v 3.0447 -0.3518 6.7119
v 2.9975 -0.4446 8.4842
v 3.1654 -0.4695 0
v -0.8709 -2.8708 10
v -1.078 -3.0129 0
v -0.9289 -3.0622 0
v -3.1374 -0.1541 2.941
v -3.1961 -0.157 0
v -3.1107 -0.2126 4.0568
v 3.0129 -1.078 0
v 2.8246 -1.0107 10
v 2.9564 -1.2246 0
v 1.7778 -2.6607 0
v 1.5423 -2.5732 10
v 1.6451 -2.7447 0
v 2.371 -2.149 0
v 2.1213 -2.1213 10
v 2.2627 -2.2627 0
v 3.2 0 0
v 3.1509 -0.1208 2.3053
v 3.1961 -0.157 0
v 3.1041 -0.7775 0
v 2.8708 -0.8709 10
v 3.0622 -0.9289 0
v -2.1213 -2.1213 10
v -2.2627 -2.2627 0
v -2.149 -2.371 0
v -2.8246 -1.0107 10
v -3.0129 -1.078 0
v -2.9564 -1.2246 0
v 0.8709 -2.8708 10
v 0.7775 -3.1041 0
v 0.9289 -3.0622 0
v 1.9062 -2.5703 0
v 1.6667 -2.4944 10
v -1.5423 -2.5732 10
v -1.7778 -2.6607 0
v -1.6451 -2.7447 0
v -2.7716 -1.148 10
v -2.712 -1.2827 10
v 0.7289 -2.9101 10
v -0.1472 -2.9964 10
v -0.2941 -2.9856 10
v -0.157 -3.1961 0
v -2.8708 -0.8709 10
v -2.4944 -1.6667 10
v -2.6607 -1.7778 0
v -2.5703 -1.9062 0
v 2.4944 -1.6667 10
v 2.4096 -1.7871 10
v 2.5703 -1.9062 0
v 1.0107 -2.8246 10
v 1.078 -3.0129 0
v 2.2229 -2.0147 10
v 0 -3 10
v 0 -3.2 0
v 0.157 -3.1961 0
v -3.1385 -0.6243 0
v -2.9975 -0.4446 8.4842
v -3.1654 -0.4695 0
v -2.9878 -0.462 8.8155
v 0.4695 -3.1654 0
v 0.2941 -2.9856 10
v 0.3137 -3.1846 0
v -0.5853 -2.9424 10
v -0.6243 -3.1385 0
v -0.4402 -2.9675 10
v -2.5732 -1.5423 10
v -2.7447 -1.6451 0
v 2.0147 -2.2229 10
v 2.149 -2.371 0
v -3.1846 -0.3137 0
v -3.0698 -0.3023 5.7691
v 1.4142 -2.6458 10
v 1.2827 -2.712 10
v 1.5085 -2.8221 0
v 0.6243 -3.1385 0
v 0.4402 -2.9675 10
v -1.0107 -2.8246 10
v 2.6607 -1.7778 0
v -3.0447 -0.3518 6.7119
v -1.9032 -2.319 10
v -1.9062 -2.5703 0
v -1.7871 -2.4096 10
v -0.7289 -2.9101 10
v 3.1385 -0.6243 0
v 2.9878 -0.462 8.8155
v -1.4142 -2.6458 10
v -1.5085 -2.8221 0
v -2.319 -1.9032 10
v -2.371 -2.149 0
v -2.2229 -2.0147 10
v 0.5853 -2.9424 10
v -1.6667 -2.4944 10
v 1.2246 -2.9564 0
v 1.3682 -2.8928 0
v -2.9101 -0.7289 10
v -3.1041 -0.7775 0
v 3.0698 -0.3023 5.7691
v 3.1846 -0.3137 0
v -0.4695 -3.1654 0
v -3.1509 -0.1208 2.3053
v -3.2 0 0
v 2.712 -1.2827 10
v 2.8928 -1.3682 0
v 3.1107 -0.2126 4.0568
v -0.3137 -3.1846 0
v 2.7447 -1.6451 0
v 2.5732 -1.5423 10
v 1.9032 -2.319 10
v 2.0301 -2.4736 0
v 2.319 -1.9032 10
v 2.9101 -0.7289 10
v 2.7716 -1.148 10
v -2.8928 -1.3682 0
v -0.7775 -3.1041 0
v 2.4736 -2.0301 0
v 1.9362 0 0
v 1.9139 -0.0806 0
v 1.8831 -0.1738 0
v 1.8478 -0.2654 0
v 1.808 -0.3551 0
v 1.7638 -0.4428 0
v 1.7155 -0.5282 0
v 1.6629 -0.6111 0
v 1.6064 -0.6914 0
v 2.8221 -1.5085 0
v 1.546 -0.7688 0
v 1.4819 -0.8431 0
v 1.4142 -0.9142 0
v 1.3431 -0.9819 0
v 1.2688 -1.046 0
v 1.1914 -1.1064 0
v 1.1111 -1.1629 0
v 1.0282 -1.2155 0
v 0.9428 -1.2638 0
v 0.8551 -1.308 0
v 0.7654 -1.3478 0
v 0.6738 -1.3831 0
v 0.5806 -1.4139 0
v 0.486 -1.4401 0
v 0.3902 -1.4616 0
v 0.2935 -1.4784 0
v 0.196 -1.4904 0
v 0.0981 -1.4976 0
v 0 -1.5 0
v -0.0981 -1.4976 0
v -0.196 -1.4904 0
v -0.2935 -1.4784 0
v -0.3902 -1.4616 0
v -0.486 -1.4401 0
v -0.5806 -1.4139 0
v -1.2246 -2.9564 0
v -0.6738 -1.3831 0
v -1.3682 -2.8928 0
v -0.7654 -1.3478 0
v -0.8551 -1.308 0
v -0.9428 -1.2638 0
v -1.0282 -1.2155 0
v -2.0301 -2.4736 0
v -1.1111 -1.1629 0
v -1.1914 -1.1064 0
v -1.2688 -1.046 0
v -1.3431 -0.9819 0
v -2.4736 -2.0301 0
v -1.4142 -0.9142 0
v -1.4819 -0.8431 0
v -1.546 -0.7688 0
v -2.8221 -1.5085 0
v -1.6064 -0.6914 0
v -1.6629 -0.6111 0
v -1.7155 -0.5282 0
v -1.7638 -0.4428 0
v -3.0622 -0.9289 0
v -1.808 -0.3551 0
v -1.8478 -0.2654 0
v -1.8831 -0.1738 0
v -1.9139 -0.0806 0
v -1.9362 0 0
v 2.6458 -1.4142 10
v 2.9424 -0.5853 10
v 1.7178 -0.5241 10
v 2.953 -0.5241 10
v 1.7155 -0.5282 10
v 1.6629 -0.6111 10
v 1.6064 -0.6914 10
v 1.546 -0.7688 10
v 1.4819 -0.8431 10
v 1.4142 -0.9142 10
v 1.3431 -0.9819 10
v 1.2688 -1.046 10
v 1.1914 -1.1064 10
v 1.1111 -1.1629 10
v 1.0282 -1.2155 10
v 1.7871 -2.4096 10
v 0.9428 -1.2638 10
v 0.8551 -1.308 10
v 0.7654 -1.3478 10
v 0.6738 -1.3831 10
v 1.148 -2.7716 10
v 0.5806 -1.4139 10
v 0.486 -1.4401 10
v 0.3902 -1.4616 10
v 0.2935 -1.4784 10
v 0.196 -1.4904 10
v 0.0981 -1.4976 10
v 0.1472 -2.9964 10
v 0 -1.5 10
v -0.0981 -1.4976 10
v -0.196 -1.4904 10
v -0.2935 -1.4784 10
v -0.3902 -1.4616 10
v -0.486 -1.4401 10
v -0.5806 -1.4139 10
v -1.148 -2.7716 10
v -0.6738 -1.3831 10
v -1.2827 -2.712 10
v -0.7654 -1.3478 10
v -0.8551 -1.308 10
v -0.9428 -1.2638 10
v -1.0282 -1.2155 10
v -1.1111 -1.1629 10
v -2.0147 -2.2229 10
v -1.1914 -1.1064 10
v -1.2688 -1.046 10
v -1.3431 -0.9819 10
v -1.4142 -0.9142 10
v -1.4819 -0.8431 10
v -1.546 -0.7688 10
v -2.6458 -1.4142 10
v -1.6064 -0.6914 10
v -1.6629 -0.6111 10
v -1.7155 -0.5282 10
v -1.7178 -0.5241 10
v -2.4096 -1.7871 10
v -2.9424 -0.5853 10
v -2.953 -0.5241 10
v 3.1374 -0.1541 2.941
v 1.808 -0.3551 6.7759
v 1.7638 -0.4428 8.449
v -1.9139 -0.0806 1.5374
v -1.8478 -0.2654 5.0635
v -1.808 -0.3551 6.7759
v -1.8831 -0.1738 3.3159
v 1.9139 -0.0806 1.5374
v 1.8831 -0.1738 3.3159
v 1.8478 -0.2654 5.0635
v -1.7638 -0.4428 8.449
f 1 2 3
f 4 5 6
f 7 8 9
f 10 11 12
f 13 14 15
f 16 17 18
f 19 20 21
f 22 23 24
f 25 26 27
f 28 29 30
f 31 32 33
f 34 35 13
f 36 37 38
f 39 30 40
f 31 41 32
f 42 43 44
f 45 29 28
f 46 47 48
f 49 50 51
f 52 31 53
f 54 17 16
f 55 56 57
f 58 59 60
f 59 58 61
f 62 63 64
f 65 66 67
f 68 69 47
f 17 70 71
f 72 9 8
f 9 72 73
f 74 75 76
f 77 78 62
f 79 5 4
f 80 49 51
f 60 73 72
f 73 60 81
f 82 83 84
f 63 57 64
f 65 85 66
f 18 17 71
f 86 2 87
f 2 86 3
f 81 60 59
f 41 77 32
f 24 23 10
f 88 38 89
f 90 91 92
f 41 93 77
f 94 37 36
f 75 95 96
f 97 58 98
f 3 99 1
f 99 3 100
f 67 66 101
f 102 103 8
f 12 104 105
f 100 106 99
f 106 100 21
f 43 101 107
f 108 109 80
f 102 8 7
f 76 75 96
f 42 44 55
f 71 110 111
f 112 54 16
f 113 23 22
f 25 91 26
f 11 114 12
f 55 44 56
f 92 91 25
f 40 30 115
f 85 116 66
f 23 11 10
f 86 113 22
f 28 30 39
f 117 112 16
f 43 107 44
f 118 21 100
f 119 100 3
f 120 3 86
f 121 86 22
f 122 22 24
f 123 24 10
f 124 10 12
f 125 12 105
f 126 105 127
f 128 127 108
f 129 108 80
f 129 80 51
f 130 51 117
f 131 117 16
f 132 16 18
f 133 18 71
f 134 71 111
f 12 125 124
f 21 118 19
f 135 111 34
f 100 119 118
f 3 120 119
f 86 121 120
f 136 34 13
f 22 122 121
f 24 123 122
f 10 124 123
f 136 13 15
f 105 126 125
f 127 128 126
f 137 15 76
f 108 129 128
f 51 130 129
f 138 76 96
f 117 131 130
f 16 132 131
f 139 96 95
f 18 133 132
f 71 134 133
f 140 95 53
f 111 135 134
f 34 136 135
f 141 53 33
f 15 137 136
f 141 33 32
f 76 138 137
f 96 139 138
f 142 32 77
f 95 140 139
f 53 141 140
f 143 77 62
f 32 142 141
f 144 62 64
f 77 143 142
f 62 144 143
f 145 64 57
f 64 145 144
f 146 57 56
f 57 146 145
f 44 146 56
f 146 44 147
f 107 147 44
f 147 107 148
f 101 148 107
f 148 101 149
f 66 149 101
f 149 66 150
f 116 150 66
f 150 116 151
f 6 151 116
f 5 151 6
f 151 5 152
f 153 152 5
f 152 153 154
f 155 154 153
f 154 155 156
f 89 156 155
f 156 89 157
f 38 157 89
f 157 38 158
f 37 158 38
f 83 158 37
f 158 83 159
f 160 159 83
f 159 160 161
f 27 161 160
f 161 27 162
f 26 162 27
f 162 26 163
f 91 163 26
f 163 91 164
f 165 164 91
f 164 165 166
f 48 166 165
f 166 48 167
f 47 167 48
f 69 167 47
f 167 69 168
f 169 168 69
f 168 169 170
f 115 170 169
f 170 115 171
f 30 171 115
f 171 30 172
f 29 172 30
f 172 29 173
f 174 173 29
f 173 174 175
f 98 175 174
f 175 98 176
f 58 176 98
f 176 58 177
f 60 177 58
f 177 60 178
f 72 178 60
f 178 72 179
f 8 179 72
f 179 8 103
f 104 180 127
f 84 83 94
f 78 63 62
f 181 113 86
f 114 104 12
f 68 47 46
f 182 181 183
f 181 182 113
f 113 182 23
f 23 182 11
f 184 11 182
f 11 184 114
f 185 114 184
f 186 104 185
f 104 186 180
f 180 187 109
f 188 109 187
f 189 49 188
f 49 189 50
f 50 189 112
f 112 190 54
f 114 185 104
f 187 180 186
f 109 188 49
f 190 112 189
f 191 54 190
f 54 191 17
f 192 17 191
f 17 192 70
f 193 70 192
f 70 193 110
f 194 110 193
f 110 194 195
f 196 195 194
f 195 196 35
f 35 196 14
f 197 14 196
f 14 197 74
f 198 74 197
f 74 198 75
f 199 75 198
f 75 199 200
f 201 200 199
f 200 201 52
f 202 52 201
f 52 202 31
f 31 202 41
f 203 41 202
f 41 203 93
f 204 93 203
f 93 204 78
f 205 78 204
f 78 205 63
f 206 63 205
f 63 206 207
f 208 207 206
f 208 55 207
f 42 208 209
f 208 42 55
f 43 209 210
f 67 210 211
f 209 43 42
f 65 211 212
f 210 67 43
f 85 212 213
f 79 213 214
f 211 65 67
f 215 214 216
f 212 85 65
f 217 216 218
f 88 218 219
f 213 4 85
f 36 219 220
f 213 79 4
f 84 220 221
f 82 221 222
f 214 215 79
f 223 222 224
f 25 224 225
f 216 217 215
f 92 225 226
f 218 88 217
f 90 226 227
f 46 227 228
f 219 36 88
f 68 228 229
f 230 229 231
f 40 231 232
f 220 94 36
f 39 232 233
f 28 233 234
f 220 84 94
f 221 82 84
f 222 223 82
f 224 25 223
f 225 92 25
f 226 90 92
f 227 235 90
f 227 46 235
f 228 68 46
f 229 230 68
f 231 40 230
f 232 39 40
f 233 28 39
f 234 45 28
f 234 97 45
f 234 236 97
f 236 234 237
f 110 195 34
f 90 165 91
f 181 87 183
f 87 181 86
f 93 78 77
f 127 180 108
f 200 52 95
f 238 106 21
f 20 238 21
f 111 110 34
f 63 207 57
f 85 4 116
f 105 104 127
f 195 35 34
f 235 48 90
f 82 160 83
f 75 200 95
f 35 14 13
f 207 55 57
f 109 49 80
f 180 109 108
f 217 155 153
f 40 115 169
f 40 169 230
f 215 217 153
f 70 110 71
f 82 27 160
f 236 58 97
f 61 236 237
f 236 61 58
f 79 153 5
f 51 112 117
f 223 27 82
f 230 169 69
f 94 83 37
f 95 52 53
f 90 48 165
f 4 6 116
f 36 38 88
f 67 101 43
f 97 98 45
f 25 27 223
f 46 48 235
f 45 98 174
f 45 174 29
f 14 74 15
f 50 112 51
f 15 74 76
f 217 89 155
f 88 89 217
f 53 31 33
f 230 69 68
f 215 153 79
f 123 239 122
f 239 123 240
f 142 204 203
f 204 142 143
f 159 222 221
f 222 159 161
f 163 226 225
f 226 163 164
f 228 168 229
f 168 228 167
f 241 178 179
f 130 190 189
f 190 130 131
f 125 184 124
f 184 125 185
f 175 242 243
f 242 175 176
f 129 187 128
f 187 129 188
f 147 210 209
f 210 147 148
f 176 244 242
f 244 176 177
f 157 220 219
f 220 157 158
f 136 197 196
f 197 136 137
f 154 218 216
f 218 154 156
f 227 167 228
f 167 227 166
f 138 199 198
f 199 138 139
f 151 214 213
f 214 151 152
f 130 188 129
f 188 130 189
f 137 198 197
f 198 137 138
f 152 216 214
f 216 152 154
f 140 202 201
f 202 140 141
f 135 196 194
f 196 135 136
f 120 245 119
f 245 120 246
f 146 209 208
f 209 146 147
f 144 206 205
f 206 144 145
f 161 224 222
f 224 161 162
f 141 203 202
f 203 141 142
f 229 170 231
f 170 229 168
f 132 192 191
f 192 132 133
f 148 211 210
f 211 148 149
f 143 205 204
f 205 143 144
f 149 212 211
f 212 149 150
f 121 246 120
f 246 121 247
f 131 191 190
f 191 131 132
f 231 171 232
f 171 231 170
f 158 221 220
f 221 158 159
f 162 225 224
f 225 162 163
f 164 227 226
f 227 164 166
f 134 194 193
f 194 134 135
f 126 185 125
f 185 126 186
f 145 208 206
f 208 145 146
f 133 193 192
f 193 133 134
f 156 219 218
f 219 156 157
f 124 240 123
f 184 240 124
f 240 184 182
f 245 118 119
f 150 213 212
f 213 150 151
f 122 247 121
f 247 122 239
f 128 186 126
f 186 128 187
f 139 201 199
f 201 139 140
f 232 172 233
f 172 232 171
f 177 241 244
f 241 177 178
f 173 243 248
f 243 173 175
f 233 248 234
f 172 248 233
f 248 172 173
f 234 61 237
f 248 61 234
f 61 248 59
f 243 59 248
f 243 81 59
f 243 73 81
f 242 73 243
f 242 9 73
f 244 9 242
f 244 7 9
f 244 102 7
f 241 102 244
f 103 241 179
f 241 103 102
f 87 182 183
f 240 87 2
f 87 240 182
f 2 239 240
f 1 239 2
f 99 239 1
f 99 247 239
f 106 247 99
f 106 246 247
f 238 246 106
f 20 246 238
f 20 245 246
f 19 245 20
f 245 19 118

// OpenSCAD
$fn=128;
difference() {
cylinder(10,3.2,3);
translate([0,0.5,-0.5])cylinder(11,2,2);
rotate([93,0,0])translate([-3.5,-0.5,-5])cube([7,11,5]);
}
